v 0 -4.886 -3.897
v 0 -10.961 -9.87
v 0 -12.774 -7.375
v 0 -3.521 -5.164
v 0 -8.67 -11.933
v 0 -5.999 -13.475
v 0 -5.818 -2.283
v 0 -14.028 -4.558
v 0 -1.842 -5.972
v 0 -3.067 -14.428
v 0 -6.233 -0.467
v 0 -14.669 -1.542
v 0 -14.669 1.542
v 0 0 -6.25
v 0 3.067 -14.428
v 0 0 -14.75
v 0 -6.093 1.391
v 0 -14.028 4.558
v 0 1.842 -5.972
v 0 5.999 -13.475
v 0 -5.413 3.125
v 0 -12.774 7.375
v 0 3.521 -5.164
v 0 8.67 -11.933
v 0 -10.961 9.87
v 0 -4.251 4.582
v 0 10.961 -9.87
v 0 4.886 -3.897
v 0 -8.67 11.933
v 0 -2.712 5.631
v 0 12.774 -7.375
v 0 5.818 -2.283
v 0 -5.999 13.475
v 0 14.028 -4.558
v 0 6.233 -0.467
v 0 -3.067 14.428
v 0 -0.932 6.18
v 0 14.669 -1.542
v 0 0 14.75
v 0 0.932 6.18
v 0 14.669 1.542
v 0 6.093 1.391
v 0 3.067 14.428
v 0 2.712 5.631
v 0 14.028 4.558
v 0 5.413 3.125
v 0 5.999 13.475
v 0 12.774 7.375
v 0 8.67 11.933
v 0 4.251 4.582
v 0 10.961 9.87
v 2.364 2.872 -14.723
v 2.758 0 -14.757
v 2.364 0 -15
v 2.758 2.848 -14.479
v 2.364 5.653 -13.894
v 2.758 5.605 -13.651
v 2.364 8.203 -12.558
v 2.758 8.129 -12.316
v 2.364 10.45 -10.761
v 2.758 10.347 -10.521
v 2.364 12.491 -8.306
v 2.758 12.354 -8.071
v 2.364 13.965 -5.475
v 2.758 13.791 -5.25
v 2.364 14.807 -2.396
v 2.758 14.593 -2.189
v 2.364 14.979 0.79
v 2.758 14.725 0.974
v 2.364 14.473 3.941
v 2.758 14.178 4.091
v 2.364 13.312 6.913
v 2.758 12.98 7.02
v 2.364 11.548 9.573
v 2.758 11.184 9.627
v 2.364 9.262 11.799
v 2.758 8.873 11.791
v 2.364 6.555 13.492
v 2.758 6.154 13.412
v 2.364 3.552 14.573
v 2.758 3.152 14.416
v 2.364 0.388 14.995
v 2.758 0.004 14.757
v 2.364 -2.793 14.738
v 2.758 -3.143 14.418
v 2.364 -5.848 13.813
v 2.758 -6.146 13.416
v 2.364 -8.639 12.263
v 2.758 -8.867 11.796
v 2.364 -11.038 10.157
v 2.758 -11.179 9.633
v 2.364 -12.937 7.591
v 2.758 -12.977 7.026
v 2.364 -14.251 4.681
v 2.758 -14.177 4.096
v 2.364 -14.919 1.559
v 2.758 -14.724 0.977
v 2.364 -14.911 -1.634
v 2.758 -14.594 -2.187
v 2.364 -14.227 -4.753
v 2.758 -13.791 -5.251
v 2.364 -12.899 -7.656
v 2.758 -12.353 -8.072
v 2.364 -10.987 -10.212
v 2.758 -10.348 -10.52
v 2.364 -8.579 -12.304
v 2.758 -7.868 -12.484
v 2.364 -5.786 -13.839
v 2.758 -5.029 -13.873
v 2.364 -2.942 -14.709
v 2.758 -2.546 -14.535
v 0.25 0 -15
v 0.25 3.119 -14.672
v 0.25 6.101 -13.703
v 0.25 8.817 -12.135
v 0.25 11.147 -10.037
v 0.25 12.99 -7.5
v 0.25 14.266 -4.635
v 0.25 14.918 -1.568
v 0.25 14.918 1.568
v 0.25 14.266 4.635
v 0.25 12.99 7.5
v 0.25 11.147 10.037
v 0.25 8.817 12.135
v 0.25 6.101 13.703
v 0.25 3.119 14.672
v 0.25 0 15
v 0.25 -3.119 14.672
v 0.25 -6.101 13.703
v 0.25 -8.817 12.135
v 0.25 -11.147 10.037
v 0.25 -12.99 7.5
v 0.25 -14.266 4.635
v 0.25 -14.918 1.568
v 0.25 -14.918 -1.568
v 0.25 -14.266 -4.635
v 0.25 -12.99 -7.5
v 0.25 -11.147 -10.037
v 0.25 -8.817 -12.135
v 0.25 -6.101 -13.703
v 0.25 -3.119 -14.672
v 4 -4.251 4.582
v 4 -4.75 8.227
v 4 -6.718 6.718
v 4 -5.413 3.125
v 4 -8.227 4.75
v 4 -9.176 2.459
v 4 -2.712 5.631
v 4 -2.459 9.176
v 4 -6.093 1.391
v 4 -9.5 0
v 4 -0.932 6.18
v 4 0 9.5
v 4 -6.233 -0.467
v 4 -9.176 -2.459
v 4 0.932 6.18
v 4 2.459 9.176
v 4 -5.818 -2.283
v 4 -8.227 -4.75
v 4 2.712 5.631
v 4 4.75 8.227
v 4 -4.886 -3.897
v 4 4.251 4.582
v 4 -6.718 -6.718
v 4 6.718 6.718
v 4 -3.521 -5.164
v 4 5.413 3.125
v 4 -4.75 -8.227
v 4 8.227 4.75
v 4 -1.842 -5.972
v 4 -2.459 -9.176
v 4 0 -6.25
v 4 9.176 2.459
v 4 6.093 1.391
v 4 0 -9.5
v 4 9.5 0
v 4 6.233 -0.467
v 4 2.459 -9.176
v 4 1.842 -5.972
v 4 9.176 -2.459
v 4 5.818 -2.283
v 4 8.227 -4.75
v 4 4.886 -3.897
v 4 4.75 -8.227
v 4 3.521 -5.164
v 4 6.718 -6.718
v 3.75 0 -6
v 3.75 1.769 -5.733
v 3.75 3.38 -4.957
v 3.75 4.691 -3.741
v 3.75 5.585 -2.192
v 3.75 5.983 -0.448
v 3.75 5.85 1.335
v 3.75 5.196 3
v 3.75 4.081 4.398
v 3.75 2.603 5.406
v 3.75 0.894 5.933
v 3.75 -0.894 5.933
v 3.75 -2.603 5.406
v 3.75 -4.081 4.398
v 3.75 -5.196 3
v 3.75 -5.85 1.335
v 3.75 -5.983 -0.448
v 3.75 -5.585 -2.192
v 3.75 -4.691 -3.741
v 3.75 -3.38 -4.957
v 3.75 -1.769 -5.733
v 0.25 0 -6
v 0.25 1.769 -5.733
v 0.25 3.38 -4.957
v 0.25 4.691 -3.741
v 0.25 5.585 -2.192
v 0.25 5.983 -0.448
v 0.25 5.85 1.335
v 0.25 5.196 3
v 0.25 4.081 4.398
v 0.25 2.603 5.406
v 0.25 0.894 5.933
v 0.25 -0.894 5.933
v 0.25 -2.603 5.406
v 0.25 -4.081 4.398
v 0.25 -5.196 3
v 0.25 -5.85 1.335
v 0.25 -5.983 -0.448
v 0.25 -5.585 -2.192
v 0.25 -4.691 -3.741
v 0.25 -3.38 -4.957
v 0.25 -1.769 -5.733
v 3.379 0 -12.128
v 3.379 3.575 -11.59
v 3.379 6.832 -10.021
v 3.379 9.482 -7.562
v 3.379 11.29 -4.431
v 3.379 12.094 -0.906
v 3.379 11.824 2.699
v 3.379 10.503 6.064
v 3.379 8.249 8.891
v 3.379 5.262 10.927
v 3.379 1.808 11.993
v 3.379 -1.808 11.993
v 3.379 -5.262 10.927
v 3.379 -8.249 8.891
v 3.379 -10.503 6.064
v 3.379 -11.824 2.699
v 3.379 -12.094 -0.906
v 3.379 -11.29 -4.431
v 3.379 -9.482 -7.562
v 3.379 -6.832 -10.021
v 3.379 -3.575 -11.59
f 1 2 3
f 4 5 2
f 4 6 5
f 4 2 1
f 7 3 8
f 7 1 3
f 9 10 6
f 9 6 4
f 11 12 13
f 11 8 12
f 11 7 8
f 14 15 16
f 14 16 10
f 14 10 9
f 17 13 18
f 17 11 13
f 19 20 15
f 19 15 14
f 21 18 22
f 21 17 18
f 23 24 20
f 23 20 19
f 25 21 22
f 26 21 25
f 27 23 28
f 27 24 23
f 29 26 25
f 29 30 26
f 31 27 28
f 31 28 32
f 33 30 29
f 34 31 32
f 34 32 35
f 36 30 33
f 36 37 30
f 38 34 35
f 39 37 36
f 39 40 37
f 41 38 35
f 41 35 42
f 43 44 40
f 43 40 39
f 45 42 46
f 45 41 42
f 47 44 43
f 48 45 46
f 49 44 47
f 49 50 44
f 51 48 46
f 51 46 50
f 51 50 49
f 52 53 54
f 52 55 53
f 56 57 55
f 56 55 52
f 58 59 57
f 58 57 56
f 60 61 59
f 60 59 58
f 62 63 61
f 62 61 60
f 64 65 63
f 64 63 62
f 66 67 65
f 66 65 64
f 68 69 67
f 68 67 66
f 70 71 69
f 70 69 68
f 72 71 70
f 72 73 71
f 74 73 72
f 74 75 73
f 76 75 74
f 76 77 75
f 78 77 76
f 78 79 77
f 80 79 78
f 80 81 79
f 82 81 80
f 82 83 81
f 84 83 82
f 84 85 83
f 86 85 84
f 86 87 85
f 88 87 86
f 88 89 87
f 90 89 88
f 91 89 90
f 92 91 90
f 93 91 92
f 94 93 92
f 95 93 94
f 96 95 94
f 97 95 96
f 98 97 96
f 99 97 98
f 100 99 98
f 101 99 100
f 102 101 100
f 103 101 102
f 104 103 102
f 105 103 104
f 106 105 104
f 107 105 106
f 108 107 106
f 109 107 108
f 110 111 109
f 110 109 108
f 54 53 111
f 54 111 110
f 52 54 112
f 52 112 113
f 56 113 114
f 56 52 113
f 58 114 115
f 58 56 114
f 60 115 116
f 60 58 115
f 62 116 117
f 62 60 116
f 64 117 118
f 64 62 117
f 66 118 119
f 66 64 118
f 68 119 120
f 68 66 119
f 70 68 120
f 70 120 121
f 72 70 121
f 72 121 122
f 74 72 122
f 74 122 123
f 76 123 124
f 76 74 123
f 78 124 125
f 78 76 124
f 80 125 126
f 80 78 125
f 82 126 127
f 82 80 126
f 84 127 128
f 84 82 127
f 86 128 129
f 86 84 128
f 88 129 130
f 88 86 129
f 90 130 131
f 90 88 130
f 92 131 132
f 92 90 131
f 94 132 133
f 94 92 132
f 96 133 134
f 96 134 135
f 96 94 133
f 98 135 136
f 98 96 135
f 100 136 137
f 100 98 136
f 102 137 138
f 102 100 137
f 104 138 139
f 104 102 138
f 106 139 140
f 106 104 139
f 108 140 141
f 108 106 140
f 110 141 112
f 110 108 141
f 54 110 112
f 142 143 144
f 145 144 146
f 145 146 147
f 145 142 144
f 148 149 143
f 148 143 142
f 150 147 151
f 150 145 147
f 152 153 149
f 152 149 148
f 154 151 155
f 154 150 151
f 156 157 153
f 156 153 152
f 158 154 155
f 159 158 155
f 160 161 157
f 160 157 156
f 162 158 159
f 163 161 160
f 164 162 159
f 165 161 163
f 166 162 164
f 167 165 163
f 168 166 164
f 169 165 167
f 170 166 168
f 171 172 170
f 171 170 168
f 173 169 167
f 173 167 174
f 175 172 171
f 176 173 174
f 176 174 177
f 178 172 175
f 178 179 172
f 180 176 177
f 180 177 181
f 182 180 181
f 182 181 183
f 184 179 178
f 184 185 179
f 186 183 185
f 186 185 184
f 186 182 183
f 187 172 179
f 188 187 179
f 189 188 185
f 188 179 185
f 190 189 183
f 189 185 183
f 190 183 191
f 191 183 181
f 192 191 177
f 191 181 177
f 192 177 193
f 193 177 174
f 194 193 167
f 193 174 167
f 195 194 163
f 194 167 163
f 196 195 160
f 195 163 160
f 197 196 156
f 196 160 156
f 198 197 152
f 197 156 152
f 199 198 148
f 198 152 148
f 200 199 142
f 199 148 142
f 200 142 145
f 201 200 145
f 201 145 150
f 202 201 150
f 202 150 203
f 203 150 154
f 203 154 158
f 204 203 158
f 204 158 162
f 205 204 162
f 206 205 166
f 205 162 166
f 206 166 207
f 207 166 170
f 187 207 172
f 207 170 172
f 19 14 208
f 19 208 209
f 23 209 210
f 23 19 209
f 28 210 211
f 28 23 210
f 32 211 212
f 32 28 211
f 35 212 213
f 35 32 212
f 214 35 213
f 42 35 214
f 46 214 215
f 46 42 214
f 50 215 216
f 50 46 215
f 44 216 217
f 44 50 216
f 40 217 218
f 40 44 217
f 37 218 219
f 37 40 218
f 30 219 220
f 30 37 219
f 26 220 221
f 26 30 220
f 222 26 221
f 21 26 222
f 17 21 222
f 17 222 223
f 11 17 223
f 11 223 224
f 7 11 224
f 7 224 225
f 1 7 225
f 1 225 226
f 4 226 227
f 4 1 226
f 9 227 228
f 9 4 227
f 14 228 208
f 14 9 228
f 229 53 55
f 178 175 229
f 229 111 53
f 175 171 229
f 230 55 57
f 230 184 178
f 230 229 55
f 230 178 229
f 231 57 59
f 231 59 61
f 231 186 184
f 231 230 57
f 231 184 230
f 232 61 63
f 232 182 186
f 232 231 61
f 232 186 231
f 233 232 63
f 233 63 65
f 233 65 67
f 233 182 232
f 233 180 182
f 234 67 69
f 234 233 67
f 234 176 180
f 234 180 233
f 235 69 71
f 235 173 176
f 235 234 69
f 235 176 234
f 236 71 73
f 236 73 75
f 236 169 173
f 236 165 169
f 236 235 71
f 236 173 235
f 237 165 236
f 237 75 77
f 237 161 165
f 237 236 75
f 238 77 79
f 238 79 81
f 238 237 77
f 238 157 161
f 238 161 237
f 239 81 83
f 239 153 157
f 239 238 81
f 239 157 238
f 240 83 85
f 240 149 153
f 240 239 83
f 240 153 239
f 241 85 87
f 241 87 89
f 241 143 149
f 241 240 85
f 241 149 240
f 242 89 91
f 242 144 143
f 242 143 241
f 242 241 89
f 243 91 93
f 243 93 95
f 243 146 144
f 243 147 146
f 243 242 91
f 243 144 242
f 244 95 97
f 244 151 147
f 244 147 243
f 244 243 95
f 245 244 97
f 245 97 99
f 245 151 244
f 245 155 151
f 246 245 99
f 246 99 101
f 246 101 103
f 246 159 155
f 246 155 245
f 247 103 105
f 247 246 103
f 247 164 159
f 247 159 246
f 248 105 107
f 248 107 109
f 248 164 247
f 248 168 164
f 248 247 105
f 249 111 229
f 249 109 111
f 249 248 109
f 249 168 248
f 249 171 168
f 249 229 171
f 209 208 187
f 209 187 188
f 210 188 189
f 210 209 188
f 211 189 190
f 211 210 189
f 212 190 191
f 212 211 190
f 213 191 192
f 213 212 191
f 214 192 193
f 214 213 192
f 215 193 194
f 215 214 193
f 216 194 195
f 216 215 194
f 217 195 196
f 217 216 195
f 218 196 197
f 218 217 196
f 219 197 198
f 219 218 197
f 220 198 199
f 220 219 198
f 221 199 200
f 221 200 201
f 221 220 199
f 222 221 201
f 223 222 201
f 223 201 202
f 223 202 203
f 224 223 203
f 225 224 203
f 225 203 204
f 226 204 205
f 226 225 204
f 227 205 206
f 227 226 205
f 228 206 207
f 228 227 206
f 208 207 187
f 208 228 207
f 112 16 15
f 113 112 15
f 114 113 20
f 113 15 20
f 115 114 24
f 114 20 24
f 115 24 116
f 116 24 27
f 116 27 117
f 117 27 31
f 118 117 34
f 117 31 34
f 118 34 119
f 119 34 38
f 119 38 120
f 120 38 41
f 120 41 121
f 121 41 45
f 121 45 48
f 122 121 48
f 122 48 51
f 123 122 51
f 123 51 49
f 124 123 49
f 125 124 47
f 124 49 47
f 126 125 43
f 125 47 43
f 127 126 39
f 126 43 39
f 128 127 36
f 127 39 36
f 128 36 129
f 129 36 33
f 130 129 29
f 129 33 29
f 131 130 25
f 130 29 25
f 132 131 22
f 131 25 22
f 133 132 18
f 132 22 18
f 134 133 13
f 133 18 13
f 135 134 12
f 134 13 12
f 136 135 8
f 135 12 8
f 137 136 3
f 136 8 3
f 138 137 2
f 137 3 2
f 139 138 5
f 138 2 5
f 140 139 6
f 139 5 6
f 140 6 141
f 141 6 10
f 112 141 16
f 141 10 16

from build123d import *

# Parameters (mm, degrees)
CHAMFER1_SIZE         = 0.25
CHAMFER1_EDGE_2_SIZE  = 0.25
CHAMFER1_EDGE_3_SIZE2 = 0.336401694
CHAMFER1_EDGE_3_SIZE  = 0.25
CHAMFER1_EDGE_4_SIZE  = 0.25


with BuildPart() as part:
    # Sketch1 → Revolve1 (revolve)
    with BuildSketch(Plane(origin=(0, 0, 0), x_dir=(1, 0, 0), z_dir=(0, 1, 0))):
        Polygon((2.7, 15), (4, 9.5), (4, 6), (0, 6), (0, 15), align=None)
    revolve(axis=Axis((0, 0, 0), (1, 0, 0)))

    # Chamfer1
    chamfer1_edges = [part.edges().sort_by_distance(p)[0] for p in [
        (0, 0, 6),
    ]]
    chamfer(chamfer1_edges, length=CHAMFER1_SIZE)

    # Chamfer1 edge 2
    chamfer1_edge_2_edges = [part.edges().sort_by_distance(p)[0] for p in [
        (4, 0, 6),
    ]]
    chamfer(chamfer1_edge_2_edges, length=CHAMFER1_EDGE_2_SIZE)

    # Chamfer1 edge 3
    chamfer1_edge_3_edges = [part.edges().sort_by_distance(p)[0] for p in [
        (2.7, 0, 15),
    ]]
    chamfer(chamfer1_edge_3_edges, length=CHAMFER1_EDGE_3_SIZE, length2=CHAMFER1_EDGE_3_SIZE2)

    # Chamfer1 edge 4
    chamfer1_edge_4_edges = [part.edges().sort_by_distance(p)[0] for p in [
        (0, 0, 15),
    ]]
    chamfer(chamfer1_edge_4_edges, length=CHAMFER1_EDGE_4_SIZE)


solid = part.part
